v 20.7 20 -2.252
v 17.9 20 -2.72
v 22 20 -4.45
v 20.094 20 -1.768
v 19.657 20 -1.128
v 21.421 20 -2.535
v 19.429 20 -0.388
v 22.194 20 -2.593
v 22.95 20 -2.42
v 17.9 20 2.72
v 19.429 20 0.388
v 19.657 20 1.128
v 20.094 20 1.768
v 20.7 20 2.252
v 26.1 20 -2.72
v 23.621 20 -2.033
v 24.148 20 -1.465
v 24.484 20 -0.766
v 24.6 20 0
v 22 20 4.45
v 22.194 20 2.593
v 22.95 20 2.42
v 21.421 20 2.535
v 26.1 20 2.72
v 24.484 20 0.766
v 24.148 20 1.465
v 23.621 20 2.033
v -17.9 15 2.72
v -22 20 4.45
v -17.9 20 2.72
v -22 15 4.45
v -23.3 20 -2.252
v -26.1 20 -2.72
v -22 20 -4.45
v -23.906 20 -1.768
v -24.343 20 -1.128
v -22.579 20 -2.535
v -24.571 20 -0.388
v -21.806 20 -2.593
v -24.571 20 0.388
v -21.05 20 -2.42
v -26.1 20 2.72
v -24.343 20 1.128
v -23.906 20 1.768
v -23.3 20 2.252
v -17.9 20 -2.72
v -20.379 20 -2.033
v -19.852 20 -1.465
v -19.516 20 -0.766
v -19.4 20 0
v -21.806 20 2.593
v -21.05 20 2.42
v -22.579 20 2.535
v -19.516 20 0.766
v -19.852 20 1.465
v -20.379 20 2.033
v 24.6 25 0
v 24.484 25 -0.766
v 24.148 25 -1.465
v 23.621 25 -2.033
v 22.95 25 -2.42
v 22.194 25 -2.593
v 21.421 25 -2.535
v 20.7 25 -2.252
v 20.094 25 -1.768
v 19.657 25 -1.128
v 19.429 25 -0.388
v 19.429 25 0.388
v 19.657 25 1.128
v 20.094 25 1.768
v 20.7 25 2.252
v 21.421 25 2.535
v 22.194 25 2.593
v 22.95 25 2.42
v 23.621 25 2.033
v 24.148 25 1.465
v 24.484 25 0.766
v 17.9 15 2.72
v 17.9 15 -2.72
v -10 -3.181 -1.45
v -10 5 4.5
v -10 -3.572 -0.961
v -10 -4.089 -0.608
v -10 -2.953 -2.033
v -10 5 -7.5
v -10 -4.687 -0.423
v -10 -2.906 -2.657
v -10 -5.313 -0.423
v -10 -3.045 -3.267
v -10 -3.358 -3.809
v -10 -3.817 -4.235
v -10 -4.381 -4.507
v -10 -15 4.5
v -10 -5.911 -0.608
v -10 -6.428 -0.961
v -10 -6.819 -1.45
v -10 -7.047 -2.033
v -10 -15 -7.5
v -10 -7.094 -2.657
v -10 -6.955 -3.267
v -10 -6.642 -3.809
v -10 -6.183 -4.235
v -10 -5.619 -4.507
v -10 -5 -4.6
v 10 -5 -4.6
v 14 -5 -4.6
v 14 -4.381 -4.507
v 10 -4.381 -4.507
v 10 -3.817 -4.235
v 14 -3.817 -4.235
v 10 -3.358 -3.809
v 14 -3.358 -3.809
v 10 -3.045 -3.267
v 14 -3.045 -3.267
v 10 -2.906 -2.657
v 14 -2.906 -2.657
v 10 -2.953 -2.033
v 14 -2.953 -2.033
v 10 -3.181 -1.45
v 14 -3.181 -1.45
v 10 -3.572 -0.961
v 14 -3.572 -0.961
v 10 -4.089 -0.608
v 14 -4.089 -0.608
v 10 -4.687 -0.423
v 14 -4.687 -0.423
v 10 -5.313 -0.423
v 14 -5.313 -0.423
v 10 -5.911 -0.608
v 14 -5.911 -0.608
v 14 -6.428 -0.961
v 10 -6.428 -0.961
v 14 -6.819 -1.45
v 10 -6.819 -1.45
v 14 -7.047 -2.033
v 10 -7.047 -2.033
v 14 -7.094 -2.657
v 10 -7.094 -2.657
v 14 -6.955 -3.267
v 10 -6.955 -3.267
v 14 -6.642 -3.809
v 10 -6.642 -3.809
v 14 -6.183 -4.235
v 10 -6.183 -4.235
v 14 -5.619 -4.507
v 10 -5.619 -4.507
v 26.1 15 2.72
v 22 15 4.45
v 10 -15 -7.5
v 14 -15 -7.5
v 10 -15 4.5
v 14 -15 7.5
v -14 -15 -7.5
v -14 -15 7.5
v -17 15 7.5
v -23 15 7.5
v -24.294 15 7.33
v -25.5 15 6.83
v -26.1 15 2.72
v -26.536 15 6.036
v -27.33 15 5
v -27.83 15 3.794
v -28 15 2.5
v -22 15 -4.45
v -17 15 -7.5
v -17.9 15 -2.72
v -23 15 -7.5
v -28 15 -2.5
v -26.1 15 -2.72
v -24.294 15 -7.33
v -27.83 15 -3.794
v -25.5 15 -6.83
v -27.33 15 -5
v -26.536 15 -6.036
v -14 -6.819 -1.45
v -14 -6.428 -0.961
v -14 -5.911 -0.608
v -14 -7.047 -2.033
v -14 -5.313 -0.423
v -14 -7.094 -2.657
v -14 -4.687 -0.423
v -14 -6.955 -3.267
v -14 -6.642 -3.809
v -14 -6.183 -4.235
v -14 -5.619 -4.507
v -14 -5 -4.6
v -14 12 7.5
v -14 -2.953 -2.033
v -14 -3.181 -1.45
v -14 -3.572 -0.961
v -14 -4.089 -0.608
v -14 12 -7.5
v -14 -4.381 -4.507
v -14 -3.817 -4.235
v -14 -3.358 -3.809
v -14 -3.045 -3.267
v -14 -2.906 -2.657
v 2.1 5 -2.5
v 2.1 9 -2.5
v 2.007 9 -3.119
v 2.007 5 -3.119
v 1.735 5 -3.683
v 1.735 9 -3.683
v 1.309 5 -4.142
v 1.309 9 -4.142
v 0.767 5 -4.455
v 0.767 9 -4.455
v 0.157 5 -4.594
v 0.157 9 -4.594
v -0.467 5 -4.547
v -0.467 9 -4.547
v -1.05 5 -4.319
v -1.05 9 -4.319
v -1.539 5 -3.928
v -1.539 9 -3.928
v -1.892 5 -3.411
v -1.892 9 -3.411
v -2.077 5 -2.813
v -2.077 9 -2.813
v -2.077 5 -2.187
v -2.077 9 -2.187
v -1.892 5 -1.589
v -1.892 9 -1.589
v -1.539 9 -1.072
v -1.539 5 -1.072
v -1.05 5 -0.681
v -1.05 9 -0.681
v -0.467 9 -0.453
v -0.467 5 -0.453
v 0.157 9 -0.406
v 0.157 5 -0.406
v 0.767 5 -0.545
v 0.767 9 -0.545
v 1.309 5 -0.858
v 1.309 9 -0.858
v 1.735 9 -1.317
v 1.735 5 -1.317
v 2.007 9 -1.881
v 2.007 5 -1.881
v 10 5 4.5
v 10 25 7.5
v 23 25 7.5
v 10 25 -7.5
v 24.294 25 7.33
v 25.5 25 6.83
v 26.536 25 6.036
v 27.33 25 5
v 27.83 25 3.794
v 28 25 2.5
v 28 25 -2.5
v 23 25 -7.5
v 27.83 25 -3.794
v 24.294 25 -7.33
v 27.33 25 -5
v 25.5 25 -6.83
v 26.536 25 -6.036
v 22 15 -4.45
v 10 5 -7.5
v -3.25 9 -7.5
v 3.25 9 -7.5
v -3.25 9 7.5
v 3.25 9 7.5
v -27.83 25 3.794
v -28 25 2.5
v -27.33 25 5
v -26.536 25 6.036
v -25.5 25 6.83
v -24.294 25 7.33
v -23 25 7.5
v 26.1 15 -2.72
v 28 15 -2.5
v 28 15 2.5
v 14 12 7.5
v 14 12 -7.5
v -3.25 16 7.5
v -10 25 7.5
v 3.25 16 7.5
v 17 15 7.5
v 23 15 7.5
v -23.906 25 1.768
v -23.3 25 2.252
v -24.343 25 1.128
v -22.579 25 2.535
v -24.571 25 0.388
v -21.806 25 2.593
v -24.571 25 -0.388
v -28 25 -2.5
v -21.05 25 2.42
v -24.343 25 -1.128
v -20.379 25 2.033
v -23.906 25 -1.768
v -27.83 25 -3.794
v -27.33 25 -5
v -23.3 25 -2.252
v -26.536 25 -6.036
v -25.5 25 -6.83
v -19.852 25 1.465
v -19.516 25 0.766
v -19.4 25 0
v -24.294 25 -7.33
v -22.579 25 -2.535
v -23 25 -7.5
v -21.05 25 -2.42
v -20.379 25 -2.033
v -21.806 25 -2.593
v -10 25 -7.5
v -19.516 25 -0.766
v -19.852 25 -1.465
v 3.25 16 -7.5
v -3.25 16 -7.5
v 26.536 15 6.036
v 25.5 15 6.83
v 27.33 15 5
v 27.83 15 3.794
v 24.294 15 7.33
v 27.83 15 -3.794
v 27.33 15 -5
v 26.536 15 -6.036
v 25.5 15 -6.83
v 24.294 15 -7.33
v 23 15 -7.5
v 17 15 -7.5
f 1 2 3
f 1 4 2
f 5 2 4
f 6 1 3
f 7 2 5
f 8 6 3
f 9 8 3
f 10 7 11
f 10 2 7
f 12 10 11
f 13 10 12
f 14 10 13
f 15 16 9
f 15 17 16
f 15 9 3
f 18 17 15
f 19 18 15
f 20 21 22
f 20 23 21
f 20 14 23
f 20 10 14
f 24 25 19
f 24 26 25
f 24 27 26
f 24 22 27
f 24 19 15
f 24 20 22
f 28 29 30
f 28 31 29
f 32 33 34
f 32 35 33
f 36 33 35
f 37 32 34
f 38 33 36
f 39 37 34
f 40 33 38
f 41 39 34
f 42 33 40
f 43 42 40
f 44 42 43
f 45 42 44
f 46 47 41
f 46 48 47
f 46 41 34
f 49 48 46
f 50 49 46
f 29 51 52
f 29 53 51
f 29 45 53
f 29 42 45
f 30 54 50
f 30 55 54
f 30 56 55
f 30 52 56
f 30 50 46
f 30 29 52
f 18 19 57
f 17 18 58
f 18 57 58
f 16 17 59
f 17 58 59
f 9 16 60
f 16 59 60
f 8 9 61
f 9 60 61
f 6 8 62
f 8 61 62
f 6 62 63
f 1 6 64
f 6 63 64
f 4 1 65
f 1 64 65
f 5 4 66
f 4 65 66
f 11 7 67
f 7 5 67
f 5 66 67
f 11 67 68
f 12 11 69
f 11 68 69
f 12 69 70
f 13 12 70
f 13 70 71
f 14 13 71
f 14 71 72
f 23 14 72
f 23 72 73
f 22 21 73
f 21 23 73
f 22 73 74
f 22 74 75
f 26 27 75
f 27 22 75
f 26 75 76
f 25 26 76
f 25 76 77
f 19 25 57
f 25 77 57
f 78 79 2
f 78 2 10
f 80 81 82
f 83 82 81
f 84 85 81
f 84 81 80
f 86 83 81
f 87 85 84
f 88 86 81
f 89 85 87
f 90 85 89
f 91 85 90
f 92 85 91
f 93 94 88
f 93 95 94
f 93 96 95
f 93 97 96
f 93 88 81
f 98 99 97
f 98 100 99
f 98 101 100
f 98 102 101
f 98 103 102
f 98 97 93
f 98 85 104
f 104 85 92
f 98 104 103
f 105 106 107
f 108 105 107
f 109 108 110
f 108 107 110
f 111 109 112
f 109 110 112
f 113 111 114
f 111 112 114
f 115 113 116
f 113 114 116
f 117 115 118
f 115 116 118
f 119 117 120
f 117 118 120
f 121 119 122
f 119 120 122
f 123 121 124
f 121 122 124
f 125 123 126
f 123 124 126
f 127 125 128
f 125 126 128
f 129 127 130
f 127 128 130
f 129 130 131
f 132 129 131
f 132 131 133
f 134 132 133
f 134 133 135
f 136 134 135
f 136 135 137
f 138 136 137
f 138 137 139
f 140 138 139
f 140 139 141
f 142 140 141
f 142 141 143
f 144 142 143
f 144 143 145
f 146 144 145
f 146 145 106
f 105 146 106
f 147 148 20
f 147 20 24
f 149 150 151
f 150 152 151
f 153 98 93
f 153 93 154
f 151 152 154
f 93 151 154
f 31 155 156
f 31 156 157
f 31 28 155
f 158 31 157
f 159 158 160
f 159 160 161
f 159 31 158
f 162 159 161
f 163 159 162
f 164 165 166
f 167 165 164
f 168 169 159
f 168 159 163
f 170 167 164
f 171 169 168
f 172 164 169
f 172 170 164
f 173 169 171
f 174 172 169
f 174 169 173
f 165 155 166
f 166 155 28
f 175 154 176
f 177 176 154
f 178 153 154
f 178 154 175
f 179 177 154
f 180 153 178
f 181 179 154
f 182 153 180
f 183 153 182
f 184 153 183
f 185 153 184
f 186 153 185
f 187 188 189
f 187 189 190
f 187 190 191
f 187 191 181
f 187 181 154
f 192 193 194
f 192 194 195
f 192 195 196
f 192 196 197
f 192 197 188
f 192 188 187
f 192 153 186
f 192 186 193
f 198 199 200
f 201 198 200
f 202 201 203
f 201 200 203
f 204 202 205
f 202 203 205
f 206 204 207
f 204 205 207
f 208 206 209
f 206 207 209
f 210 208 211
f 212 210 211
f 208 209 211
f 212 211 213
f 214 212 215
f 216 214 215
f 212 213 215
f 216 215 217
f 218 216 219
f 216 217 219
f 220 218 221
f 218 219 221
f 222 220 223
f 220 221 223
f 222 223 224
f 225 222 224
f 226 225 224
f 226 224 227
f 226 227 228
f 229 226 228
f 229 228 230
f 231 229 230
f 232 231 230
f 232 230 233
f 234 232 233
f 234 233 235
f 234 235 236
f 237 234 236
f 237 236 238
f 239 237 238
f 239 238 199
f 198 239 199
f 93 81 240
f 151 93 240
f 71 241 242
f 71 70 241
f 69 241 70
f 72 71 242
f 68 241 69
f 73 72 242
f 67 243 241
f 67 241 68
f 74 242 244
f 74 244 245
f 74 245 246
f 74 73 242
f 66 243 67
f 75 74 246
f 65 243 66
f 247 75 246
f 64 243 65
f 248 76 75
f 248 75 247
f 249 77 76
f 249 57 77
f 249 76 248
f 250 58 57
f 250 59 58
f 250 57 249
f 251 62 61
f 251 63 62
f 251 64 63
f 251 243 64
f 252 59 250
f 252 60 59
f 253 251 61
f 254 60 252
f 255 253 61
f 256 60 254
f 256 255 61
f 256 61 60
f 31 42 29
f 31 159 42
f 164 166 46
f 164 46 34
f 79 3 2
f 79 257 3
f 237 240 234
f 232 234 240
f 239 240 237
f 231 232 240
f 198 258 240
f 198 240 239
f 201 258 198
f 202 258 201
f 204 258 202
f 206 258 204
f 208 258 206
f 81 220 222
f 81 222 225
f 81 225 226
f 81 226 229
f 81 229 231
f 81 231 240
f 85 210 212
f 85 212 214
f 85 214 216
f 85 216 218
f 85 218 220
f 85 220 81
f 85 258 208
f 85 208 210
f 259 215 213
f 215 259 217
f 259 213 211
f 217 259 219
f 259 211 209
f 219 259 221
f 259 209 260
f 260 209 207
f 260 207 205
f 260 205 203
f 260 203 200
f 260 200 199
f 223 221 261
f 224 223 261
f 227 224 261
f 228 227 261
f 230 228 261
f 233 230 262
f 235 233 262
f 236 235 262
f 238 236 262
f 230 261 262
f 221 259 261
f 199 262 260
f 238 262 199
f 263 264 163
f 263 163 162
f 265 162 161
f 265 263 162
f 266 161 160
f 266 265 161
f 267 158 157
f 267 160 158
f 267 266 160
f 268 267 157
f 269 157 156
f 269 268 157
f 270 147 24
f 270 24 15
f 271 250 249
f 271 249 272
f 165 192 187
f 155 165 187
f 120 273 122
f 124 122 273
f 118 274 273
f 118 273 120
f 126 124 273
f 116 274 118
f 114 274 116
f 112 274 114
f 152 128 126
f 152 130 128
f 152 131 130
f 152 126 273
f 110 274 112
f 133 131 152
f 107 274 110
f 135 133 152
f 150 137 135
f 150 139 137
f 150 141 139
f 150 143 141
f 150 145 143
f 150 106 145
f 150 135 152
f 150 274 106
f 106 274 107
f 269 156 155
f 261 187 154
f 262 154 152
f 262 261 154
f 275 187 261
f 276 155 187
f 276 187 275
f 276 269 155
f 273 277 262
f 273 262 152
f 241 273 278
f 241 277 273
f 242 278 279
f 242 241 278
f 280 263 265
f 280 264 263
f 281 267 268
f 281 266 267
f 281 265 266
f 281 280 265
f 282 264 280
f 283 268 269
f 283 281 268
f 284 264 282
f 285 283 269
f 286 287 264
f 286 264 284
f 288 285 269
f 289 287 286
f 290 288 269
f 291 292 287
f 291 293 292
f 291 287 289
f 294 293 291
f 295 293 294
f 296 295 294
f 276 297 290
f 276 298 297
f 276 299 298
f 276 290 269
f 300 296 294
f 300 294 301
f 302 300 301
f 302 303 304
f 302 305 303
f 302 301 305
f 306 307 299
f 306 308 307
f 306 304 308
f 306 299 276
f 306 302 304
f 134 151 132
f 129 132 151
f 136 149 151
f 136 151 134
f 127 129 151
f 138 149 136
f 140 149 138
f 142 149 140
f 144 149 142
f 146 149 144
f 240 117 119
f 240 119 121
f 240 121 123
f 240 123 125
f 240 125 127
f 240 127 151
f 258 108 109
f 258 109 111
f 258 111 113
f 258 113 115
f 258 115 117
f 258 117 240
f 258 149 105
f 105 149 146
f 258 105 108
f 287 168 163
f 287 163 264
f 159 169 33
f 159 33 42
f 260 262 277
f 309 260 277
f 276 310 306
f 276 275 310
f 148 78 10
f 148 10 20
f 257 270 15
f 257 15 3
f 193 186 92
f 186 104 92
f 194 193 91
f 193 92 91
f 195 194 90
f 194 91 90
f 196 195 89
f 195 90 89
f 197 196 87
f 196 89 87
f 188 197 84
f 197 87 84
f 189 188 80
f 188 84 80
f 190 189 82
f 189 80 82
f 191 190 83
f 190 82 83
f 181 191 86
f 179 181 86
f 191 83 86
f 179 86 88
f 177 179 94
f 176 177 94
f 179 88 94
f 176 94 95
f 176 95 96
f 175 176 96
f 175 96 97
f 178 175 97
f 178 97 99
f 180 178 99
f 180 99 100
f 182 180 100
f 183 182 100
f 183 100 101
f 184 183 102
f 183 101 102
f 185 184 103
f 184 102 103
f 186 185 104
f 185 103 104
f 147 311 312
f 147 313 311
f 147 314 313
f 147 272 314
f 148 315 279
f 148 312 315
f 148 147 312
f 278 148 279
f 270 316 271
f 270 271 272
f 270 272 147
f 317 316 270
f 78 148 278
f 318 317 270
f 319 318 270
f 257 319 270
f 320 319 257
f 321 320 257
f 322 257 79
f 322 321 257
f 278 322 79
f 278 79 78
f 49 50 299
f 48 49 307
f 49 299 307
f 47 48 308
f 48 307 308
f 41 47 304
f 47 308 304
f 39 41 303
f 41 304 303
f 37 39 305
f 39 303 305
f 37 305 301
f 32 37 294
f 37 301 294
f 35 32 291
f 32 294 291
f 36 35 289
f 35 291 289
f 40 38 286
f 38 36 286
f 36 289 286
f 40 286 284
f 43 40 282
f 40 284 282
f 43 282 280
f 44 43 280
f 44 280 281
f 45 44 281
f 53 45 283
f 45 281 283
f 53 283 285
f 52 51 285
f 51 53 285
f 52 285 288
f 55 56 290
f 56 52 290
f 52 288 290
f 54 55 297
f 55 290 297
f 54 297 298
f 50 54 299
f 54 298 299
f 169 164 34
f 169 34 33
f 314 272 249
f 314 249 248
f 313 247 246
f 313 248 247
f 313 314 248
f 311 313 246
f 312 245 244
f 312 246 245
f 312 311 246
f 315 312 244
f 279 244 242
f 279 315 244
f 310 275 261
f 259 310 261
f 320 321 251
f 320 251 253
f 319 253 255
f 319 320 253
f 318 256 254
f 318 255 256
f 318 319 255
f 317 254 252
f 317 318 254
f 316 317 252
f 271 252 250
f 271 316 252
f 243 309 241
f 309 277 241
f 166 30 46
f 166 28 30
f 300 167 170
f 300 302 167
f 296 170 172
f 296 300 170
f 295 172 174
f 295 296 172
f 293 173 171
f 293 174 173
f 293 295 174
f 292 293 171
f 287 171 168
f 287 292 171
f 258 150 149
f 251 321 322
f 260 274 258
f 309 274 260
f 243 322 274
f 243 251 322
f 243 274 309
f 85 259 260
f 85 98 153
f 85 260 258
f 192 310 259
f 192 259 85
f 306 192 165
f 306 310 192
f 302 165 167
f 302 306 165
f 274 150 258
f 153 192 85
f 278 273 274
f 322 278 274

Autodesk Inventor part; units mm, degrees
ref_plane "YZ Plane" through (0, 0, 0) normal (1, 0, 0) x (0, 1, 0)
ref_plane "XZ Plane" through (0, 0, 0) normal (0, 1, 0) x (-1, 0, 0)
ref_plane "XY Plane" through (0, 0, 0) normal (0, 0, 1) x (1, 0, 0)
sketch "Sketch1" plane through (0, 0, 0) normal (0, 0, 1) x (1, 0, 0)
  line L0 (-28, 25) -> (28, 25)
  line L1 (28, 25) -> (28, 15)
  line L2 (28, 15) -> (14, 15)
  line L3 (14, 15) -> (14, -15)
  line L4 (14, -15) -> (10, -15)
  line L5 (10, -15) -> (10, 15)
  line L6 (10, 15) -> (-10, 15)
  line L7 (-10, 15) -> (-10, -15)
  line L8 (-10, -15) -> (-14, -15)
  line L9 (-14, -15) -> (-14, 15)
  line L10 (-14, 15) -> (-28, 15)
  line L11 (-28, 15) -> (-28, 25)
  point P0 (0, 0)
  point P1 (0, 25)
  point P2 (0, 15)
  point P3 (10, 0)
  dimension "d0" = 20
  dimension "d1" = 30
  dimension "d2" = 4
  dimension "d3" = 4
  dimension "d4" = 14
  dimension "d5" = 10
extrude "Extrusion1" add sketch "Sketch1" along normal mid plane 15
sketch "Sketch2" plane through (-28, 25, 7.5) normal (0, 1, 0) x (1, 0, 0)
  circle A0 centre (6, 7.5) radius 2.6
  circle A1 centre (50, 7.5) radius 2.6
  line L0 (0, 15) -> (0, 0) projected
  line L1 (56, 0) -> (56, 15) projected
  point P0 (28, 7.5)
  dimension "d8" = 5.2
  dimension "d9" = 6
  dimension "d10" = 6
extrude "Extrusion2" cut sketch "Sketch2" against normal up to next
sketch "Sketch3" plane through (-28, 15, 7.5) normal (0, -1, 0) x (1, 0, 0)
  circle A0 centre (6, -7.5) radius 2.6 projected
  circle A1 centre (50, -7.5) radius 2.6 projected
  line L0 (1.9, -10.2201) -> (1.9, -4.7799)
  line L1 (1.9, -4.7799) -> (6, -3.05)
  line L2 (6, -3.05) -> (10.1, -4.7799)
  line L3 (10.1, -4.7799) -> (10.1, -10.2201)
  line L4 (14, 0) -> (14, -15) projected
  line L5 (10.1, -10.2201) -> (6, -11.95)
  line L6 (6, -11.95) -> (1.9, -10.2201)
  point P0 (28, -7.5)
  point P1 (1.9, -7.5)
  dimension "d13" = 8.2
  dimension "d22" = 8.9
  dimension "d23" = 8.2
extrude "Extrusion3" cut sketch "Sketch3" against normal blind 5 contours L0 L1 L2 L3 L5 L6
mirror "Mirror1" about plane through (0, 0, 0) normal (1, 0, 0) of "Extrusion3"
sketch "Sketch4" plane through (14, -15, 7.5) normal (1, 0, 0) x (0, 0, -1)
  circle A0 centre (10, 10) radius 2.1
  line L0 (0, 0) -> (15, 0) projected
  point P0 (7.5, 15)
  point P1 (7.5, 0)
  point P2 (7.5, 0)
  dimension "d24" = 4.2
  dimension "d25" = 10
extrude "Extrusion4" cut sketch "Sketch4" against normal up to surface (28 mm away)
fillet "Fillet1" radius 5 4 edges at (-28, 20, 7.5) (-28, 20, -7.5) (28, 20, 7.5) (28, 20, -7.5)
chamfer "Chamfer1" distance 3 angle 45 2 edges at (-14, 15, 0) (14, 15, 0)
sketch "Sketch8" plane through (0, 0, 7.5) normal (0, 0, 1) x (1, 0, 0)
  line L0 (-10, 15) -> (10, 15)
  line L1 (10, 15) -> (10, -15)
  line L2 (10, -15) -> (-10, -15)
  line L3 (-10, -15) -> (-10, 15)
  point P0 (0, 0)
extrude "Extrusion7" add sketch "Sketch8" against normal blind 3
sketch "Sketch9" plane through (0, 0, -7.5) normal (0, 0, -1) x (-1, 0, 0)
  line L0 (-10, 5) -> (10, 5)
  line L1 (10, -15) -> (14, -15) projected
  line L2 (-10, 5) -> (-10, 15)
  line L3 (-10, 15) -> (10, 15)
  line L4 (10, 15) -> (10, 5)
  point P0 (0, 0)
  dimension "d44" = 20
extrude "Extrusion8" add sketch "Sketch9" against normal up to surface (12 mm away)
sketch "Sketch6" plane through (0, 0, 7.5) normal (0, 0, 1) x (1, 0, 0)
  line L0 (-3.25, 16) -> (3.25, 16)
  line L1 (3.25, 16) -> (10, 25)
  line L2 (28, 25) -> (-28, 25) projected
  line L3 (-3.25, 16) -> (-10, 25)
  line L4 (-10, 25) -> (10, 25)
  line L5 (-14, -15) -> (-10, -15) projected
  line L6 (-10, 5) -> (10, 5) projected
  line L7 (-3.25, 16) -> (-3.25, 9)
  line L8 (-3.25, 9) -> (3.25, 9)
  line L9 (3.25, 9) -> (3.25, 16)
  point P0 (0, 0)
  point P1 (0, 16)
  point P2 (0, 25)
  point P3 (-10, 15)
  point P4 (0, 25)
  point P5 (0, 25)
  dimension "d29" = 6.5
  dimension "d30" = 20
  dimension "d47" = 9
  dimension "d48" = 4
extrude "Extrusion5" cut sketch "Sketch6" against normal up to surface (15 mm away)
sketch "Sketch11" plane through (-3.25, 9, 7.5) normal (0, 1, 0) x (1, 0, 0)
  line L0 (13.25, 7.9) -> (13.25, 12.1) projected
  line L1 (17.25, 12.1) -> (17.25, 7.9) projected
  circle A0 centre (3.25, 10) radius 2.1
  point P0 (3.25, 7.5)
  point P1 (17.25, 10)
  dimension "d49" = 4.2
extrude "Extrusion9" cut sketch "Sketch11" against normal up to next
equation "\"d3\" = d2"
properties part number "holder-GT2-x-carriage-left"
